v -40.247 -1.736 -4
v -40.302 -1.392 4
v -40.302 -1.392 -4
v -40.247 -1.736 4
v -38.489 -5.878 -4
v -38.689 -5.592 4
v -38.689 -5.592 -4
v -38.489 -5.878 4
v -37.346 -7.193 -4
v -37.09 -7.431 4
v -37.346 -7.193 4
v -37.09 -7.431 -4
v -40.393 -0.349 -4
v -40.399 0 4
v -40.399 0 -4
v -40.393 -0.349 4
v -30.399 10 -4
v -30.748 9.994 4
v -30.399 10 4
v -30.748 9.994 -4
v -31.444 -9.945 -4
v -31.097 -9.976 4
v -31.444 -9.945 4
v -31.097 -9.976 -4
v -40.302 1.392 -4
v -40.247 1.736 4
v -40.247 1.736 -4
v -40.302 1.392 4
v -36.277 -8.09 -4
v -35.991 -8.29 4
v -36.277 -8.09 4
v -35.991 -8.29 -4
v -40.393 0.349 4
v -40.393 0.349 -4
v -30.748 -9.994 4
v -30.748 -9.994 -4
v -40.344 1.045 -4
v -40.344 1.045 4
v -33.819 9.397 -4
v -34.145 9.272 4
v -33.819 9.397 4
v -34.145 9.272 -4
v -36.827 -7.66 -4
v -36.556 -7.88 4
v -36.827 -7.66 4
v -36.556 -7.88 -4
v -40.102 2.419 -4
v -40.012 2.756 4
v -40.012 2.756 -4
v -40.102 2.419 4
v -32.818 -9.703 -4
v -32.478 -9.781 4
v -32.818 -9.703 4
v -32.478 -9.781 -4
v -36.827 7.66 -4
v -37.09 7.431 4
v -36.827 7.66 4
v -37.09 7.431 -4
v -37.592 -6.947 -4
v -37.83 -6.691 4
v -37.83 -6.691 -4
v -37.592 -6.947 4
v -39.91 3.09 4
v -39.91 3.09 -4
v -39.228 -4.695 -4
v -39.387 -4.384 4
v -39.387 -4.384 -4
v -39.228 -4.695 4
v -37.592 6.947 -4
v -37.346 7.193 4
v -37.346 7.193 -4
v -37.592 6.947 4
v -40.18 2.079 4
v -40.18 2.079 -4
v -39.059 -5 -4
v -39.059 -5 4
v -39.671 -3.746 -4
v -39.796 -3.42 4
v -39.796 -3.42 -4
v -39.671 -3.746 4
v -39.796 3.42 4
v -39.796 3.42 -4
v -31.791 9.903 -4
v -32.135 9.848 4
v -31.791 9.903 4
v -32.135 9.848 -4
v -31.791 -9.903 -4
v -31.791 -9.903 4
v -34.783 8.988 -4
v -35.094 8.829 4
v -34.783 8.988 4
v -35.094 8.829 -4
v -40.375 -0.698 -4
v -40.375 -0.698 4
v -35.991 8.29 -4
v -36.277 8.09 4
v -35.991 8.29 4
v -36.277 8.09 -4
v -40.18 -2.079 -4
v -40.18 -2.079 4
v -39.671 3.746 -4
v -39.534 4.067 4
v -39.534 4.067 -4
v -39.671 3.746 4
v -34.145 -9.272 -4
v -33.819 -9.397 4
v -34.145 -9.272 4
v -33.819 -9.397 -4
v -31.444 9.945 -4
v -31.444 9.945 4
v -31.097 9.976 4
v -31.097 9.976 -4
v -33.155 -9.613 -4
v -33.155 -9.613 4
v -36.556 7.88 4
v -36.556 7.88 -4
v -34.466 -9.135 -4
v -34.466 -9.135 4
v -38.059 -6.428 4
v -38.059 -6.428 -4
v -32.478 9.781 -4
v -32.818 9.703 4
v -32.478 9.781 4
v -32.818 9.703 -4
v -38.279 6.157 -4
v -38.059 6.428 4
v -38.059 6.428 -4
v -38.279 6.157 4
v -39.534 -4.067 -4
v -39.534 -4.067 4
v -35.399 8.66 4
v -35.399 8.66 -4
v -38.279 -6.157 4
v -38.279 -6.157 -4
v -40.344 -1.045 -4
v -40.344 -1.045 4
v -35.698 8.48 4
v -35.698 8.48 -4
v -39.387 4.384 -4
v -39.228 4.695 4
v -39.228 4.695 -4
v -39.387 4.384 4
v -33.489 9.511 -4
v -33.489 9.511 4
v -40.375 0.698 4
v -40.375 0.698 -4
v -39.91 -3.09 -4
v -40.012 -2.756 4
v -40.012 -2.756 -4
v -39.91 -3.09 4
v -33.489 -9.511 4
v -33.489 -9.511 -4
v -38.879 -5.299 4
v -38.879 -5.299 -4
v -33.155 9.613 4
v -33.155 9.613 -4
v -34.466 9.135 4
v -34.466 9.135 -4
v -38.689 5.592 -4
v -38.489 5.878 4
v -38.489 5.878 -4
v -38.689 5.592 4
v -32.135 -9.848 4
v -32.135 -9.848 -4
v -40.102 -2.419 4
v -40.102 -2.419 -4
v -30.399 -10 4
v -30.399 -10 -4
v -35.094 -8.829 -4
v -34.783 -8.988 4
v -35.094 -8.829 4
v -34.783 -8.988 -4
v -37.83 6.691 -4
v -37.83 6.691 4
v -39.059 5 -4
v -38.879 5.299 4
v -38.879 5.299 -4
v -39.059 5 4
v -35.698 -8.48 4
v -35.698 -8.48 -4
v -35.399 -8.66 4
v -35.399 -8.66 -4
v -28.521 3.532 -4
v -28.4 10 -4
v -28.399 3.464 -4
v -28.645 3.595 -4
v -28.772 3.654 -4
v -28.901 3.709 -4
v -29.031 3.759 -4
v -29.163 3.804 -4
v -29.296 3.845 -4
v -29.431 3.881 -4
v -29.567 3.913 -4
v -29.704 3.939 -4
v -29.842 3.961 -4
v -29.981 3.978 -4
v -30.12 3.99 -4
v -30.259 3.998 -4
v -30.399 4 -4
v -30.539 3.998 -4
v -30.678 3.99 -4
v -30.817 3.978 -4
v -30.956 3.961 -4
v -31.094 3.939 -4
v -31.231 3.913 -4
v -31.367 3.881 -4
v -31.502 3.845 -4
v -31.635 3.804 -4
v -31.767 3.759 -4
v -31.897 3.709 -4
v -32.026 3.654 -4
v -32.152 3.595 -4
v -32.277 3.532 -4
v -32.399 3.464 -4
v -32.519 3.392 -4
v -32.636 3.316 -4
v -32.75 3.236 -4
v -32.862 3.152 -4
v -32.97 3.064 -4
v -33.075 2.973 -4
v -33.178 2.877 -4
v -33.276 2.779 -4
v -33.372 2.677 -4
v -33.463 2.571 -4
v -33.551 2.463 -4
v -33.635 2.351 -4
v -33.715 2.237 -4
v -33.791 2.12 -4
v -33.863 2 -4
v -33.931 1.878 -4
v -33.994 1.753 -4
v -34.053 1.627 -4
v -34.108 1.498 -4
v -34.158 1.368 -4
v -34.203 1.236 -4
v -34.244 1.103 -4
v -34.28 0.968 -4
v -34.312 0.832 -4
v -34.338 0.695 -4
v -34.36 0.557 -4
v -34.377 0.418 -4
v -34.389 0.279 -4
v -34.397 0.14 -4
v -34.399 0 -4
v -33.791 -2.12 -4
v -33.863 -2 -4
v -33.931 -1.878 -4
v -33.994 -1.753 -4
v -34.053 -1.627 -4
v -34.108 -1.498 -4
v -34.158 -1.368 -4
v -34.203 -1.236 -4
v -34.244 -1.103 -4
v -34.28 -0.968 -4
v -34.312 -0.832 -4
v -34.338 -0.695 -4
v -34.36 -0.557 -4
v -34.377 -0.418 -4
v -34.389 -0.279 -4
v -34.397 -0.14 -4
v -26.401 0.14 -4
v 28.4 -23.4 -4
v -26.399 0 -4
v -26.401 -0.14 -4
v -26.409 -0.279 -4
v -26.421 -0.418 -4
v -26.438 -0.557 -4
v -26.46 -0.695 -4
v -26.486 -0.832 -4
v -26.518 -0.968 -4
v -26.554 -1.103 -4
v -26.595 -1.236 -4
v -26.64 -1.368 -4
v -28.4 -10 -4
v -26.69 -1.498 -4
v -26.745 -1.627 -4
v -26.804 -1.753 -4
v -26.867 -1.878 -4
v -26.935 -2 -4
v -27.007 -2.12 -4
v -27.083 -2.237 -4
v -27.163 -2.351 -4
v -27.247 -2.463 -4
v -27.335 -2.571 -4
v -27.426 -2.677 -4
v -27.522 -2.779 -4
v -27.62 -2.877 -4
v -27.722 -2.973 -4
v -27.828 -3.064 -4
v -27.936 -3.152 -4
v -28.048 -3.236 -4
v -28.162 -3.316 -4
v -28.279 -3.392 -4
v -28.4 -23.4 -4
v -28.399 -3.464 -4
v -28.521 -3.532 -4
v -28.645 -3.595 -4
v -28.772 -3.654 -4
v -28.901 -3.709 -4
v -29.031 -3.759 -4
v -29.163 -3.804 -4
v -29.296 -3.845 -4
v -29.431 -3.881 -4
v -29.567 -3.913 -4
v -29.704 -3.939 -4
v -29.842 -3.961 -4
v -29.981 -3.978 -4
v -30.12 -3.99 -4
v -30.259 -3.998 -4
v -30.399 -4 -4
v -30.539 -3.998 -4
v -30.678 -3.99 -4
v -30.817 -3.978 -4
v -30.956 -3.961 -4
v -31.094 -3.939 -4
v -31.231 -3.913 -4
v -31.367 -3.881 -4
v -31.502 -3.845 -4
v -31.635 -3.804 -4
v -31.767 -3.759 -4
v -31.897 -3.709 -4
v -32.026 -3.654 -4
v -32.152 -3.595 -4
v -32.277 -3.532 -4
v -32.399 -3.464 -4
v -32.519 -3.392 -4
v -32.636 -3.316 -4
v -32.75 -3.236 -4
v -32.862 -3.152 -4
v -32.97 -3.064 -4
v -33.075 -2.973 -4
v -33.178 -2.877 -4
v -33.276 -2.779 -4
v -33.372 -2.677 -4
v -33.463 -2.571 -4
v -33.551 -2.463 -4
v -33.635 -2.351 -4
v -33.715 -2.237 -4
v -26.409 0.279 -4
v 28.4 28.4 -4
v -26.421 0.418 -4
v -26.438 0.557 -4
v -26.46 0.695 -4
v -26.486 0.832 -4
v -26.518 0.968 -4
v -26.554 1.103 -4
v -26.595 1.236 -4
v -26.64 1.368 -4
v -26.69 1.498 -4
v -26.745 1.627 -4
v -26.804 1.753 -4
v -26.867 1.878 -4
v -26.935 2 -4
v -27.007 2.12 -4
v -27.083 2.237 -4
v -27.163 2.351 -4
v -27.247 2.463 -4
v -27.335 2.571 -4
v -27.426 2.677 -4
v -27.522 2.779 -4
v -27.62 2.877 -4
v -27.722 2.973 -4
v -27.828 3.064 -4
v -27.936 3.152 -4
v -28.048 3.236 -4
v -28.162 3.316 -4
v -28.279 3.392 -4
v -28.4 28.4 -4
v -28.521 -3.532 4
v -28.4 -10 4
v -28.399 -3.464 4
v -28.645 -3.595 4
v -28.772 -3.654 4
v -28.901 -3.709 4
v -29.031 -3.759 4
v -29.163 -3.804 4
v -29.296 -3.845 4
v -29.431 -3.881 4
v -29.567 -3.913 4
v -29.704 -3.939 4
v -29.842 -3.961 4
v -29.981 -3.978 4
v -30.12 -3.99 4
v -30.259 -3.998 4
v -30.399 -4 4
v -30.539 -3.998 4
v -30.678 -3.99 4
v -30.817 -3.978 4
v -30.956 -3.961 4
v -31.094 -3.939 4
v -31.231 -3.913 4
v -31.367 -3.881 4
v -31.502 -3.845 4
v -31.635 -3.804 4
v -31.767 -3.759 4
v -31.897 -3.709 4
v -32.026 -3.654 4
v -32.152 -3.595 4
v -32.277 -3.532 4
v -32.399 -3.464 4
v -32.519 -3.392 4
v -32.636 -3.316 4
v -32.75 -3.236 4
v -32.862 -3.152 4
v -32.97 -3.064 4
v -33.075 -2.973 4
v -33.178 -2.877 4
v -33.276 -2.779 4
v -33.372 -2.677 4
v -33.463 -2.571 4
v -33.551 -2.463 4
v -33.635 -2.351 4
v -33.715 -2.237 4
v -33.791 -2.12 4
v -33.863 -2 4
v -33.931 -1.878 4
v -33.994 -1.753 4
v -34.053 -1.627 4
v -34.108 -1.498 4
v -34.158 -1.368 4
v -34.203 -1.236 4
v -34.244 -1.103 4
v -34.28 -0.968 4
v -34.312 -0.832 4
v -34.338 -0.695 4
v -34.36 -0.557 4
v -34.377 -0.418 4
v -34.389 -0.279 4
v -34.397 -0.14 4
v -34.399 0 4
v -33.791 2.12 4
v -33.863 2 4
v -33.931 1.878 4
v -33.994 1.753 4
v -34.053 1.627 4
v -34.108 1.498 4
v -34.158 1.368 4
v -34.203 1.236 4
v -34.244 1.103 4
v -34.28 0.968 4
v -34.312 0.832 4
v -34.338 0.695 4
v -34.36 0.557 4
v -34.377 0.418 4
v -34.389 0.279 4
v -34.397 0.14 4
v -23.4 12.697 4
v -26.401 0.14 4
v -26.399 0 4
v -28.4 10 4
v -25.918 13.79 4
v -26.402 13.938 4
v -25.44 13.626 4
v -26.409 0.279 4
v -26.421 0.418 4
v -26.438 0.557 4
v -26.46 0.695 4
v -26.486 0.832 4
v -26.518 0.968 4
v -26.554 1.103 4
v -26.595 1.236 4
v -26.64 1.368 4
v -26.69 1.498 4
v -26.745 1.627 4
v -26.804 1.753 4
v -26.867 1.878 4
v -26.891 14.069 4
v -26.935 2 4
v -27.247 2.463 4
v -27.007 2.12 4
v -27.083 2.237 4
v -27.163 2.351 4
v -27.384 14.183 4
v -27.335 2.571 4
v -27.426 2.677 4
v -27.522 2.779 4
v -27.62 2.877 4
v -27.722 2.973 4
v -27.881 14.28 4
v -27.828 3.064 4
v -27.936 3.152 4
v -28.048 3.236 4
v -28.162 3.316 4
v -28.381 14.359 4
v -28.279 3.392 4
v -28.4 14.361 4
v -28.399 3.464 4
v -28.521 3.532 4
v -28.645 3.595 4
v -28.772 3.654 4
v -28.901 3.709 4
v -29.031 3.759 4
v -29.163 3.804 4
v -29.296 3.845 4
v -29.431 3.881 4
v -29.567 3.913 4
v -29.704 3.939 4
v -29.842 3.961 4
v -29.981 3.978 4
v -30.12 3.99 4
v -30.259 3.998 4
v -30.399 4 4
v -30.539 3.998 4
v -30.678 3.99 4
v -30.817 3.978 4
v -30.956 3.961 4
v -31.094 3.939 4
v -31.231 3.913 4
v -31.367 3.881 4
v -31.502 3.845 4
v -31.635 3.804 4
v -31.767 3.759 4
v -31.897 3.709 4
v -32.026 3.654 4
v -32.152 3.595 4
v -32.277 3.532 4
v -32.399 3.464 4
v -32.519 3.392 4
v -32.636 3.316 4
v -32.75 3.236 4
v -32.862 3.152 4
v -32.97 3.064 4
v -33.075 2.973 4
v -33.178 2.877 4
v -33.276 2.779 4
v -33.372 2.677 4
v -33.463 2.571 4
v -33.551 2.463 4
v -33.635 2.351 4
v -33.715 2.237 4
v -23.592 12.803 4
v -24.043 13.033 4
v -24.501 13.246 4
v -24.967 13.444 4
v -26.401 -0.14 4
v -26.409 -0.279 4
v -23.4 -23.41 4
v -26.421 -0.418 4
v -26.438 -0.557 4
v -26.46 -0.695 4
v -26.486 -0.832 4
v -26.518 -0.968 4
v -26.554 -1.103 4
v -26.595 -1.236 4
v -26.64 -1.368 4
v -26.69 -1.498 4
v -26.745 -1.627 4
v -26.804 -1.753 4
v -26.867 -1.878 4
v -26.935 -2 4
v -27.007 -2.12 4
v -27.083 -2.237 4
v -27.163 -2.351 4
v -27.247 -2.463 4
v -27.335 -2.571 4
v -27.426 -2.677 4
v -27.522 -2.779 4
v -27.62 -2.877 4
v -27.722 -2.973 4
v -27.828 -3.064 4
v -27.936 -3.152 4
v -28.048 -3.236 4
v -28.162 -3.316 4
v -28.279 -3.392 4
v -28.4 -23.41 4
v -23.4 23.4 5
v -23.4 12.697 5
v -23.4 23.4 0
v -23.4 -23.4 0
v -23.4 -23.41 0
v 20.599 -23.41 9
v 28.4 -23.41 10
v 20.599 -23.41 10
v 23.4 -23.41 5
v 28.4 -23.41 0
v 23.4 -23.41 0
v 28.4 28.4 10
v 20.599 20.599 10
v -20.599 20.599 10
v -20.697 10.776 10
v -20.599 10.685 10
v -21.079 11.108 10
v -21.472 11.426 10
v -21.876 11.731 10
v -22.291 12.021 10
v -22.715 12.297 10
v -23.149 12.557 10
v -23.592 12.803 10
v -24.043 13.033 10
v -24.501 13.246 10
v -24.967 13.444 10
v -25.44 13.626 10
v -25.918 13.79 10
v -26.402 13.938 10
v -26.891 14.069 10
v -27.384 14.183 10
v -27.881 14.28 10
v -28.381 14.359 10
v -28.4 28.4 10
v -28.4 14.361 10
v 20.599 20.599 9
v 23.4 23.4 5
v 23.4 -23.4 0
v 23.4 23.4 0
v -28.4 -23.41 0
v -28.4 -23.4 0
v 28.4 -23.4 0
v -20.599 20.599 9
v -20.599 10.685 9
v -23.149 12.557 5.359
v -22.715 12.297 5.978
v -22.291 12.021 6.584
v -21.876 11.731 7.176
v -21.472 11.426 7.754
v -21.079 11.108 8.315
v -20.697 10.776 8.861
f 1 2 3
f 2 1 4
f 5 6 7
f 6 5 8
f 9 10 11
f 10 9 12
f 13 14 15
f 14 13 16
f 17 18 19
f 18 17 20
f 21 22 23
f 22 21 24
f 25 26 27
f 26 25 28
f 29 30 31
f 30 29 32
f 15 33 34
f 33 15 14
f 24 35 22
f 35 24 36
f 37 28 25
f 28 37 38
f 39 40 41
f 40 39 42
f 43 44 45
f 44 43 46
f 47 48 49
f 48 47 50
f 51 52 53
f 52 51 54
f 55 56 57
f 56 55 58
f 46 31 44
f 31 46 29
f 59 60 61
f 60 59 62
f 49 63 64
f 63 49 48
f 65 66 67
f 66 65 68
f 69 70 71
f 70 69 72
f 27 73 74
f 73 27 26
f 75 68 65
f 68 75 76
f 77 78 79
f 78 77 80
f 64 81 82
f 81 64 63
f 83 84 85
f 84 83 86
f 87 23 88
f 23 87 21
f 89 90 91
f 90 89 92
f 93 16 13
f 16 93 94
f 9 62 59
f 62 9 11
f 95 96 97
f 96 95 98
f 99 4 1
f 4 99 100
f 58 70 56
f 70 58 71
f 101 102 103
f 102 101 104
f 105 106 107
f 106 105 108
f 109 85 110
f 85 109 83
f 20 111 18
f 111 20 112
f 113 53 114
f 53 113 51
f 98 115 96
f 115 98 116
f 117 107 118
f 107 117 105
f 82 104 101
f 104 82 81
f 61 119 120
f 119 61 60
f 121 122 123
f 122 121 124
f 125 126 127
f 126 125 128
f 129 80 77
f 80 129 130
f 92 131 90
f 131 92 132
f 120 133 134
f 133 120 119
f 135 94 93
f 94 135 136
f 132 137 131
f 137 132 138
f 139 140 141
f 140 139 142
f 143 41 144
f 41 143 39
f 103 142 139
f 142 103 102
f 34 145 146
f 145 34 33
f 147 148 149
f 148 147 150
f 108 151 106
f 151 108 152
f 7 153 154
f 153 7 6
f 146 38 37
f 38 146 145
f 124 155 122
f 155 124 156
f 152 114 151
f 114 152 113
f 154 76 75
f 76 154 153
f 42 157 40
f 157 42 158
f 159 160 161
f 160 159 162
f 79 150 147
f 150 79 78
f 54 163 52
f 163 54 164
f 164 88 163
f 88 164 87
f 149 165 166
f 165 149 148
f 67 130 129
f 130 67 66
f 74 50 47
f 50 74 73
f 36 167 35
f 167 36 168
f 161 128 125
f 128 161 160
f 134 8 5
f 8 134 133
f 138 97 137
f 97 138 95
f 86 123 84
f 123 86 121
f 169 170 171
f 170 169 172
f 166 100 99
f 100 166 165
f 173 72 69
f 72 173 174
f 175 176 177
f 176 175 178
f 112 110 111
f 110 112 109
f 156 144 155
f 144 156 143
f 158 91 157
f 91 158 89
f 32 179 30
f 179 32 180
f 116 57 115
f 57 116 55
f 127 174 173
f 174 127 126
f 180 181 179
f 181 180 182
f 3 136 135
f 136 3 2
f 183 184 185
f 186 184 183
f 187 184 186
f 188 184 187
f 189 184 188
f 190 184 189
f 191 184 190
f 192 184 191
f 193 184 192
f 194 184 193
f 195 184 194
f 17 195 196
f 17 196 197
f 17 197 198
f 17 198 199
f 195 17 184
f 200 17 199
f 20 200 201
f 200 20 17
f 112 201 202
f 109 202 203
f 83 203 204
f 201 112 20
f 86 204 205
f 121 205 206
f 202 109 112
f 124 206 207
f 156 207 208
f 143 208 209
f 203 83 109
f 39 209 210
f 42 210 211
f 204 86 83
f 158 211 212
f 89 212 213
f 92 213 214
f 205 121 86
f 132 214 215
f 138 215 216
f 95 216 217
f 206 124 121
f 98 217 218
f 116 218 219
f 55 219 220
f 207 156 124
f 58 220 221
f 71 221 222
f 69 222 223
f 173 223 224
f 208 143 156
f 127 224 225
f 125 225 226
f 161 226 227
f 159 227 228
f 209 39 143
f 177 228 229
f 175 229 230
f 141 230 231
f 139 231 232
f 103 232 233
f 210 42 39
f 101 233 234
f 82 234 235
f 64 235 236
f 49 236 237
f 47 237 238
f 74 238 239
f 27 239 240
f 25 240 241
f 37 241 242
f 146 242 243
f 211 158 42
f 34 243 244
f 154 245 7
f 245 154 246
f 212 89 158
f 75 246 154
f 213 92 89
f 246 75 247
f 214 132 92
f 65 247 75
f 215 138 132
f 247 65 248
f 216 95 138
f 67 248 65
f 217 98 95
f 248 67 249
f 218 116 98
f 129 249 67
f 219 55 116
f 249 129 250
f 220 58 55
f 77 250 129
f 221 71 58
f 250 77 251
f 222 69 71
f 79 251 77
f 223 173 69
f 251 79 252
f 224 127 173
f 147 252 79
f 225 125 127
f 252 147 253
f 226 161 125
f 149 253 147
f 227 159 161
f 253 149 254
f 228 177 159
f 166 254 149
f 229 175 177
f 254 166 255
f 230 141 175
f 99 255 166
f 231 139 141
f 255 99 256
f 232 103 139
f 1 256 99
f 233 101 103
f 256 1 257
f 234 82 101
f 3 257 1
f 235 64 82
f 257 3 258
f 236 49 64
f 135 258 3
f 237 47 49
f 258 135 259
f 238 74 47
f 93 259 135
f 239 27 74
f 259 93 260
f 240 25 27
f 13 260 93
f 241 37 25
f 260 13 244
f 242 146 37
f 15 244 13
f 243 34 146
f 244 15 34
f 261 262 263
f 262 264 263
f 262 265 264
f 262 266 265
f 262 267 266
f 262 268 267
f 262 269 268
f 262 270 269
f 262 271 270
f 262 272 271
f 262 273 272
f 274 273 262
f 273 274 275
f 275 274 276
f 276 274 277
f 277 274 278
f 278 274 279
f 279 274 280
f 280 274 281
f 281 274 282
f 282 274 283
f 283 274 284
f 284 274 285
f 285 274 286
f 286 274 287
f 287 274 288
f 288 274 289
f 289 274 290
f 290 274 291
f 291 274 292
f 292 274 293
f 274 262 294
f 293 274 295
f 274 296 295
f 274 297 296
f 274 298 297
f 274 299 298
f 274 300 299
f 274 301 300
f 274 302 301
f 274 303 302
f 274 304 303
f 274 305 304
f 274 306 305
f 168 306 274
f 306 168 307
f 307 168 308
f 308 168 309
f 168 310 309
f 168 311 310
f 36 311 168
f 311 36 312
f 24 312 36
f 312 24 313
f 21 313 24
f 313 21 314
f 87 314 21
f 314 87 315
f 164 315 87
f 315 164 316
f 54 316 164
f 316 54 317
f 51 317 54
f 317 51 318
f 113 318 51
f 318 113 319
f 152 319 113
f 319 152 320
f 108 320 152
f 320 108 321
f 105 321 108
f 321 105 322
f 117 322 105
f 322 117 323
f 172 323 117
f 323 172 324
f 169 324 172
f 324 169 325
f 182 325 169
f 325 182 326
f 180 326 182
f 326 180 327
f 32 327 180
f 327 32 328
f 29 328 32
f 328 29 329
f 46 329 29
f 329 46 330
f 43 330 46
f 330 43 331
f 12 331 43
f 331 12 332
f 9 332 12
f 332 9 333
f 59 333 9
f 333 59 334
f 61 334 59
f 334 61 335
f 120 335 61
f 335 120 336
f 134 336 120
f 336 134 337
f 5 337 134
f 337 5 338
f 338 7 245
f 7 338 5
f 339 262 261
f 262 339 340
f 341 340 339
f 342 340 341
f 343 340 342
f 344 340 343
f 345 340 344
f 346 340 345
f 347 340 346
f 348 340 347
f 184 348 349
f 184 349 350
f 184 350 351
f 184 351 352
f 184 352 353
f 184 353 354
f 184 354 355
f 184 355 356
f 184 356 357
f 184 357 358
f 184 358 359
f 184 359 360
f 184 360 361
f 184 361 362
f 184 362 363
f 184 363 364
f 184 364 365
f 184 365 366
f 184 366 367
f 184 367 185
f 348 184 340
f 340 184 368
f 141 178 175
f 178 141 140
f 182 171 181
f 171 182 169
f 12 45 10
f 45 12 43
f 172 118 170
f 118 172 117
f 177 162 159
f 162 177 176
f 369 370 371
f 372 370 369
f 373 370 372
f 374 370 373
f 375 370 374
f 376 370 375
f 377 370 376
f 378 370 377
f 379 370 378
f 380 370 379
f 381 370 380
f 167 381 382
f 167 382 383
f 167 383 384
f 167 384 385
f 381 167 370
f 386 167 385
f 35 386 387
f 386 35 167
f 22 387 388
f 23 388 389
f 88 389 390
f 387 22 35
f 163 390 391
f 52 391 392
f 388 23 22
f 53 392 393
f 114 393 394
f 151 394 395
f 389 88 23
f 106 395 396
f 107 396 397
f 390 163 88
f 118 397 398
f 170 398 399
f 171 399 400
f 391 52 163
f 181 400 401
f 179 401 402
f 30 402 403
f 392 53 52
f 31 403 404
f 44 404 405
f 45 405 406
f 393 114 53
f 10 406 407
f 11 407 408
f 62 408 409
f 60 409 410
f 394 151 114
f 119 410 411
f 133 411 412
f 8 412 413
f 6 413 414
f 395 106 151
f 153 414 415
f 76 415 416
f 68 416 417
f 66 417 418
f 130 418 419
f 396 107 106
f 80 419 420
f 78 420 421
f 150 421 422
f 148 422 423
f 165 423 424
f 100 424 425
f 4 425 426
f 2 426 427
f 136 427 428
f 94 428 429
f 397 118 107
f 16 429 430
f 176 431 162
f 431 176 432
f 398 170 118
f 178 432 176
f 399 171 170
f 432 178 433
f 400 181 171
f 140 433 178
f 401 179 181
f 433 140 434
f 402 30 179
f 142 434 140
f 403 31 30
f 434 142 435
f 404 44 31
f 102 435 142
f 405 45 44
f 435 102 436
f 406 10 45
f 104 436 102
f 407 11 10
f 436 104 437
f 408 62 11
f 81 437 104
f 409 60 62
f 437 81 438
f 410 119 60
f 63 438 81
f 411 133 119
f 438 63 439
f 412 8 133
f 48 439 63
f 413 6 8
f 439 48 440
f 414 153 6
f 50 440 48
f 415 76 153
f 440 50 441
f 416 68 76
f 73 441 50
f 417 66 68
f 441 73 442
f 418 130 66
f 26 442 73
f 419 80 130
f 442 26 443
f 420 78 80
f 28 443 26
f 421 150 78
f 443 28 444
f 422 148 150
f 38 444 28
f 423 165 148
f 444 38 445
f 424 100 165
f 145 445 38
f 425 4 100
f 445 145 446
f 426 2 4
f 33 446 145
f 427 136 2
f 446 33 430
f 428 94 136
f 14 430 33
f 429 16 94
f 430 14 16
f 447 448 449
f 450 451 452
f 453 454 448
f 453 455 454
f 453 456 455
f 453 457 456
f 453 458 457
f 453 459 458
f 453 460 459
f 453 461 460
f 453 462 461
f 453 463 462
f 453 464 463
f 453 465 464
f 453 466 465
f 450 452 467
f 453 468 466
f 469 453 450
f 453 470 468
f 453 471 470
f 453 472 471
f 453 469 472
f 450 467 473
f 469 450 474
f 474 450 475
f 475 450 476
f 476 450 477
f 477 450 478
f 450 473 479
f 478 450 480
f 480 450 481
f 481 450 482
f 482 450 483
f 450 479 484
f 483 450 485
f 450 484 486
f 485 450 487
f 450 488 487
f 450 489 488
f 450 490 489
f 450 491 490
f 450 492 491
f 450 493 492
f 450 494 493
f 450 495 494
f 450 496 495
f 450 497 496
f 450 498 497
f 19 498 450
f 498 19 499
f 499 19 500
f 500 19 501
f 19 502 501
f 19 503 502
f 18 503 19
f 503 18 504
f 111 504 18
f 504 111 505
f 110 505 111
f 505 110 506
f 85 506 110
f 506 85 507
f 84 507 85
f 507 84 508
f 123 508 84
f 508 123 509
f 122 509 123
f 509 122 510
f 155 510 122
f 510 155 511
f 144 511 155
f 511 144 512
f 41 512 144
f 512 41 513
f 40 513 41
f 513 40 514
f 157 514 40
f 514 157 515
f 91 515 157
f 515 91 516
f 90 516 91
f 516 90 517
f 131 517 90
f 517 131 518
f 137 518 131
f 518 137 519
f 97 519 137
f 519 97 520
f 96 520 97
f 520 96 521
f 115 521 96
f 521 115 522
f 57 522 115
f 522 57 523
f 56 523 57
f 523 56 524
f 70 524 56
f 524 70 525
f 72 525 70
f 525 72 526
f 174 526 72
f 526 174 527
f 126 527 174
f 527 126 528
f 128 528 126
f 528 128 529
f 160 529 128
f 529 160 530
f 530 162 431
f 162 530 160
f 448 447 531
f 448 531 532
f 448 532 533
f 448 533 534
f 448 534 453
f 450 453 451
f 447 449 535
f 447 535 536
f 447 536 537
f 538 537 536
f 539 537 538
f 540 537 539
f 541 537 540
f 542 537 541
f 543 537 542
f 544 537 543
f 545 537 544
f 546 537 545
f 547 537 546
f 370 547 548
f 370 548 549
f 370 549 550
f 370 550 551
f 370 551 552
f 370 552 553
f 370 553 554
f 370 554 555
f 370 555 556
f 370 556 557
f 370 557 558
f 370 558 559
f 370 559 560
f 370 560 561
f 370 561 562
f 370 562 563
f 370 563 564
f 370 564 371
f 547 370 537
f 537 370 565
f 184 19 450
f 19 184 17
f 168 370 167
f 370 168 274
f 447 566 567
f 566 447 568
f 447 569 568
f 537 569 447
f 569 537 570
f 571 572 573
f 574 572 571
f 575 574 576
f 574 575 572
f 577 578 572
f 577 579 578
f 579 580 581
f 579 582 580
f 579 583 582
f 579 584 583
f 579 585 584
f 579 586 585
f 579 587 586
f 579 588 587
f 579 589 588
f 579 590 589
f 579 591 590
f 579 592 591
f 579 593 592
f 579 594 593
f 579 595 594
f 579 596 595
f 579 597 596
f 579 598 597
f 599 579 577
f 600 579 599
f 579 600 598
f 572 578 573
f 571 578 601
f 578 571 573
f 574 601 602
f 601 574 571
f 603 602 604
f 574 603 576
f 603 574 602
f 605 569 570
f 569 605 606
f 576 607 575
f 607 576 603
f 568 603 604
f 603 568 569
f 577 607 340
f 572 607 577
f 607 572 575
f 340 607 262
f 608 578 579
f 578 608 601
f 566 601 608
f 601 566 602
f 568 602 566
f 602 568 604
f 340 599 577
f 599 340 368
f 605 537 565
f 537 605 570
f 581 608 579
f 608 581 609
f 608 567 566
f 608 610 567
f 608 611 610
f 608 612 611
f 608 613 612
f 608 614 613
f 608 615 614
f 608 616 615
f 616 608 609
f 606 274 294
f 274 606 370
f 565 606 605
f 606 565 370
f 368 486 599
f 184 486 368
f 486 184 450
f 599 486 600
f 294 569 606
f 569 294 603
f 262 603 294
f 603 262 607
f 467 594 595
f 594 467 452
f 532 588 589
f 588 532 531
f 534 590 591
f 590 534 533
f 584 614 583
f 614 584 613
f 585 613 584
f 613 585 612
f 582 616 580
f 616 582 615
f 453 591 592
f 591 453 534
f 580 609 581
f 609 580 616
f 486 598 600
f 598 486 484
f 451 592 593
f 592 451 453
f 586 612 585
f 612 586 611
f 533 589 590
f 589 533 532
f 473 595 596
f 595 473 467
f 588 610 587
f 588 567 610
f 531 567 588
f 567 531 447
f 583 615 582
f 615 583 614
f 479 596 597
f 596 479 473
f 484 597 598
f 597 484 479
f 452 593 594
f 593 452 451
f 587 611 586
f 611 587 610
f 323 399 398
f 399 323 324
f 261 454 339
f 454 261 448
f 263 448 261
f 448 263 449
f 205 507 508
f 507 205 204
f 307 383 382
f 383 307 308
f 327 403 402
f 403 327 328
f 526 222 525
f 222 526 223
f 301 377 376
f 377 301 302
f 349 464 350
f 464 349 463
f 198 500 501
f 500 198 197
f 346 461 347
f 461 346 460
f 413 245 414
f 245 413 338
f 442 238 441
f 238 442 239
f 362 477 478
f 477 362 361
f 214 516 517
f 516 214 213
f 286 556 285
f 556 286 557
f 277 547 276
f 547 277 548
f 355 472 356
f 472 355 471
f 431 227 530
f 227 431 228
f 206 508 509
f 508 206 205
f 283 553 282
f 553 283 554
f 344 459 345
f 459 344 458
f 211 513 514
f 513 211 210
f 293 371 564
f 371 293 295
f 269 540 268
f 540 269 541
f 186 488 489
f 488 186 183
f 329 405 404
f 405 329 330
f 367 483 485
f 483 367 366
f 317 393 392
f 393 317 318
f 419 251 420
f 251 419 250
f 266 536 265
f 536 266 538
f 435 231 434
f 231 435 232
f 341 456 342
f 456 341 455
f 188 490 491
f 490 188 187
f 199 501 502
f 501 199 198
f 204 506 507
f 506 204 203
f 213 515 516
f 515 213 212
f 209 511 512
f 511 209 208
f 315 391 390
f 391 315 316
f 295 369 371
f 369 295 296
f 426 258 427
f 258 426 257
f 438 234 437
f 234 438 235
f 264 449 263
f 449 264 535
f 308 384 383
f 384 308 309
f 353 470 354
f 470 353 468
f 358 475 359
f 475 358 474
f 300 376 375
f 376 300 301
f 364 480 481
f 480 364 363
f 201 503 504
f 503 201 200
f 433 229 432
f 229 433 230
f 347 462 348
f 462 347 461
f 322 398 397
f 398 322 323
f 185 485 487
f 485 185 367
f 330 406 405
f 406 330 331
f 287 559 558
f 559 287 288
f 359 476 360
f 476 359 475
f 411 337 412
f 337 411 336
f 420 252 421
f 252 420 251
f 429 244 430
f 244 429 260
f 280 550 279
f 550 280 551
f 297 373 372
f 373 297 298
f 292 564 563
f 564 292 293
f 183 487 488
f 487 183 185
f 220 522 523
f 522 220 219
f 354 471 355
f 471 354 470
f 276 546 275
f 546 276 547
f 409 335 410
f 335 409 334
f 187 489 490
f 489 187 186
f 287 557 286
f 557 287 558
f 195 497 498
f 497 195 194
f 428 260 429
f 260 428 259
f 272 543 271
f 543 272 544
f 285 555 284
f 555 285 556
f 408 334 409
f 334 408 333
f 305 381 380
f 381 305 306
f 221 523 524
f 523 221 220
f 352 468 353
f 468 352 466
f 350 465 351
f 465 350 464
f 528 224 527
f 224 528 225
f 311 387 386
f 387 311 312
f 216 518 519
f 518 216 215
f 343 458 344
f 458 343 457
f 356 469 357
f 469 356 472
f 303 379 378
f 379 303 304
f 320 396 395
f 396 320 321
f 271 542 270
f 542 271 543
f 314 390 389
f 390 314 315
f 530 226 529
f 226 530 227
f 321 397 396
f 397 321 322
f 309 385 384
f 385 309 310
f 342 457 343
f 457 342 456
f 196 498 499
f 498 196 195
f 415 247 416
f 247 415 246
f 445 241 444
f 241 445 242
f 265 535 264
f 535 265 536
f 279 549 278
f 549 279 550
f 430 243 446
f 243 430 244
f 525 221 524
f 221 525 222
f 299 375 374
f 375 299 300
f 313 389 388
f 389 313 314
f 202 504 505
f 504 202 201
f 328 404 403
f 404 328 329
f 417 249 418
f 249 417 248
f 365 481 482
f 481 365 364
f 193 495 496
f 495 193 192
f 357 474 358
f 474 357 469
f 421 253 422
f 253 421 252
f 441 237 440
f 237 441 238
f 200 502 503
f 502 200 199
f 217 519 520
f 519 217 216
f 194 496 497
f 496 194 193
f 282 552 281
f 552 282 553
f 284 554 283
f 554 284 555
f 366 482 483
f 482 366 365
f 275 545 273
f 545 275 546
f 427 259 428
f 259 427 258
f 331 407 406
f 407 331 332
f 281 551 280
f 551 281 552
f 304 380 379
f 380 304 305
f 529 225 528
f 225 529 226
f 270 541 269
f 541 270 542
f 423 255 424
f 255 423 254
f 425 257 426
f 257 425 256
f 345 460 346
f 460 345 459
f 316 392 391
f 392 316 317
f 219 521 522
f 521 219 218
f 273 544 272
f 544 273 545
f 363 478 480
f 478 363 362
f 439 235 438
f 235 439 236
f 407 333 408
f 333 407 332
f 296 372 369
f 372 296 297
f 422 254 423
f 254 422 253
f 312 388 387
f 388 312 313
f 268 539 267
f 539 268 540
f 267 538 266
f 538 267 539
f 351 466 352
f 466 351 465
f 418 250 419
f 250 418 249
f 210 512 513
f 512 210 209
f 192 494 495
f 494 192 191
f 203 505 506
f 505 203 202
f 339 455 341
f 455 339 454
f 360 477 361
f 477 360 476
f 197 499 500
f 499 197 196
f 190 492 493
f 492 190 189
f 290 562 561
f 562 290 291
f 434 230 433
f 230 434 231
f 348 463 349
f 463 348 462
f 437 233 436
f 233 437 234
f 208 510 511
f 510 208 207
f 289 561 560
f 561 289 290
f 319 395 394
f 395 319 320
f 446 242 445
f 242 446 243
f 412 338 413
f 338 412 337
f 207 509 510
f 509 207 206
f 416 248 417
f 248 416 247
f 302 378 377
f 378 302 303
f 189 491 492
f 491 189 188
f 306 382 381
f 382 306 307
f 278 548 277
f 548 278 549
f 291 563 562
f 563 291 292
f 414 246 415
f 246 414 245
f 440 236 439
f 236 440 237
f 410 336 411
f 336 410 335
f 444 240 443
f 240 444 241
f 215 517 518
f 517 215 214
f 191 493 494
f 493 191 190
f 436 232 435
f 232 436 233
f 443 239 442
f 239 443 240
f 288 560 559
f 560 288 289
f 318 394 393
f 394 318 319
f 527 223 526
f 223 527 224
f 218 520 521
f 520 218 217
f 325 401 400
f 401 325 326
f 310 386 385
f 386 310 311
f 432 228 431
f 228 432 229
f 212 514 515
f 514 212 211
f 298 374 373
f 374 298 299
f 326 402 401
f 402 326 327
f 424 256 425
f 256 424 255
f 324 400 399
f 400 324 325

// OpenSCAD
plate_width=46.3+0.5;
plate_length = plate_width;
plate_bottom=5;
plate_lip=1;
plate_height=10;
plate_angle=55;
side_thickness=5;
base_thickness=4;

handle_radius = 25/2;
handle_clamp_distance=2;
handle_support_radius = 8;
handle_axis = -(handle_radius - handle_clamp_distance + plate_width/2 - (plate_height - plate_bottom) / tan(plate_angle));
handle_spacing=2;
handle_height=6;
handle_axis_r=8/2;

$fs=0.1;
$fa=2;

module counter_profile(thickness=5){
    y1 = plate_height - plate_bottom - plate_lip;
    x1 = y1 / tan(plate_angle);

    
    polygon(points=[
        [0,0],
        [0,plate_bottom],
        [-x1,plate_height-plate_lip],
        [-x1,plate_height],
        [thickness, plate_height],
        [thickness, 0]
    ], convexity=2);
}

module counter(length, thickness=5){
    translate([length+0.01,0,0])
    rotate([90,0,-90])
    linear_extrude(height=length+0.02,convexity=2)
    counter_profile();
}

module rim(){

    translate([plate_width/2,-plate_width/2,0])
    rotate([0,0,90])
    counter(plate_length, side_thickness);

    translate([-plate_width/2,plate_width/2,0])
    scale([1,-1,1])
    counter(plate_length, side_thickness);




    translate([-plate_width/2,-plate_width/2,0])
    rotate([0,0,90])
    scale([1,-1,1])
    counter(plate_length, side_thickness);
    
    translate([plate_width/2,plate_width/2,0])
    intersection(){
        //cylinder(r=side_thickness,h=plate_height);
        cube([side_thickness,side_thickness,plate_height]);
    }

    translate([-plate_width/2,plate_width/2,0])
    intersection(){
        //cylinder(r=side_thickness,h=plate_height);
        translate([-side_thickness,0,0])
        cube([side_thickness,side_thickness,plate_height]);
    }
}

module handle_support(){
        difference(){
            translate([handle_axis,0,-base_thickness]){
                cylinder(r=handle_support_radius + handle_spacing, h=plate_height - handle_height+base_thickness);
                translate([0,-handle_support_radius-handle_spacing,0])
                cube([100, 2*(handle_support_radius+handle_spacing), plate_height - handle_height+base_thickness]);
            }
            translate([-plate_width/2,-plate_width/2,-base_thickness-1])
            cube([100,100,plate_height - handle_height+base_thickness+2]);
        }
}

module handle_cutout(){
    translate([handle_axis,0,plate_height - handle_height]){
        cylinder(r=handle_radius + handle_spacing, h=handle_height+1);
        translate([-handle_radius-handle_spacing,-100,0])
        cube([2*(handle_radius+handle_spacing), 100, handle_height+1]);
    }
}

module base(){
    translate([-plate_width/2-side_thickness,-plate_width/2,-base_thickness])
    cube([plate_width+2*side_thickness, plate_width+side_thickness,base_thickness]);
}


difference(){
    union(){
        handle_support();
        base();
        rim();
    }
    handle_cutout();
    translate([handle_axis,0,-base_thickness-1])
    cylinder(r=handle_axis_r, h=100);
}
